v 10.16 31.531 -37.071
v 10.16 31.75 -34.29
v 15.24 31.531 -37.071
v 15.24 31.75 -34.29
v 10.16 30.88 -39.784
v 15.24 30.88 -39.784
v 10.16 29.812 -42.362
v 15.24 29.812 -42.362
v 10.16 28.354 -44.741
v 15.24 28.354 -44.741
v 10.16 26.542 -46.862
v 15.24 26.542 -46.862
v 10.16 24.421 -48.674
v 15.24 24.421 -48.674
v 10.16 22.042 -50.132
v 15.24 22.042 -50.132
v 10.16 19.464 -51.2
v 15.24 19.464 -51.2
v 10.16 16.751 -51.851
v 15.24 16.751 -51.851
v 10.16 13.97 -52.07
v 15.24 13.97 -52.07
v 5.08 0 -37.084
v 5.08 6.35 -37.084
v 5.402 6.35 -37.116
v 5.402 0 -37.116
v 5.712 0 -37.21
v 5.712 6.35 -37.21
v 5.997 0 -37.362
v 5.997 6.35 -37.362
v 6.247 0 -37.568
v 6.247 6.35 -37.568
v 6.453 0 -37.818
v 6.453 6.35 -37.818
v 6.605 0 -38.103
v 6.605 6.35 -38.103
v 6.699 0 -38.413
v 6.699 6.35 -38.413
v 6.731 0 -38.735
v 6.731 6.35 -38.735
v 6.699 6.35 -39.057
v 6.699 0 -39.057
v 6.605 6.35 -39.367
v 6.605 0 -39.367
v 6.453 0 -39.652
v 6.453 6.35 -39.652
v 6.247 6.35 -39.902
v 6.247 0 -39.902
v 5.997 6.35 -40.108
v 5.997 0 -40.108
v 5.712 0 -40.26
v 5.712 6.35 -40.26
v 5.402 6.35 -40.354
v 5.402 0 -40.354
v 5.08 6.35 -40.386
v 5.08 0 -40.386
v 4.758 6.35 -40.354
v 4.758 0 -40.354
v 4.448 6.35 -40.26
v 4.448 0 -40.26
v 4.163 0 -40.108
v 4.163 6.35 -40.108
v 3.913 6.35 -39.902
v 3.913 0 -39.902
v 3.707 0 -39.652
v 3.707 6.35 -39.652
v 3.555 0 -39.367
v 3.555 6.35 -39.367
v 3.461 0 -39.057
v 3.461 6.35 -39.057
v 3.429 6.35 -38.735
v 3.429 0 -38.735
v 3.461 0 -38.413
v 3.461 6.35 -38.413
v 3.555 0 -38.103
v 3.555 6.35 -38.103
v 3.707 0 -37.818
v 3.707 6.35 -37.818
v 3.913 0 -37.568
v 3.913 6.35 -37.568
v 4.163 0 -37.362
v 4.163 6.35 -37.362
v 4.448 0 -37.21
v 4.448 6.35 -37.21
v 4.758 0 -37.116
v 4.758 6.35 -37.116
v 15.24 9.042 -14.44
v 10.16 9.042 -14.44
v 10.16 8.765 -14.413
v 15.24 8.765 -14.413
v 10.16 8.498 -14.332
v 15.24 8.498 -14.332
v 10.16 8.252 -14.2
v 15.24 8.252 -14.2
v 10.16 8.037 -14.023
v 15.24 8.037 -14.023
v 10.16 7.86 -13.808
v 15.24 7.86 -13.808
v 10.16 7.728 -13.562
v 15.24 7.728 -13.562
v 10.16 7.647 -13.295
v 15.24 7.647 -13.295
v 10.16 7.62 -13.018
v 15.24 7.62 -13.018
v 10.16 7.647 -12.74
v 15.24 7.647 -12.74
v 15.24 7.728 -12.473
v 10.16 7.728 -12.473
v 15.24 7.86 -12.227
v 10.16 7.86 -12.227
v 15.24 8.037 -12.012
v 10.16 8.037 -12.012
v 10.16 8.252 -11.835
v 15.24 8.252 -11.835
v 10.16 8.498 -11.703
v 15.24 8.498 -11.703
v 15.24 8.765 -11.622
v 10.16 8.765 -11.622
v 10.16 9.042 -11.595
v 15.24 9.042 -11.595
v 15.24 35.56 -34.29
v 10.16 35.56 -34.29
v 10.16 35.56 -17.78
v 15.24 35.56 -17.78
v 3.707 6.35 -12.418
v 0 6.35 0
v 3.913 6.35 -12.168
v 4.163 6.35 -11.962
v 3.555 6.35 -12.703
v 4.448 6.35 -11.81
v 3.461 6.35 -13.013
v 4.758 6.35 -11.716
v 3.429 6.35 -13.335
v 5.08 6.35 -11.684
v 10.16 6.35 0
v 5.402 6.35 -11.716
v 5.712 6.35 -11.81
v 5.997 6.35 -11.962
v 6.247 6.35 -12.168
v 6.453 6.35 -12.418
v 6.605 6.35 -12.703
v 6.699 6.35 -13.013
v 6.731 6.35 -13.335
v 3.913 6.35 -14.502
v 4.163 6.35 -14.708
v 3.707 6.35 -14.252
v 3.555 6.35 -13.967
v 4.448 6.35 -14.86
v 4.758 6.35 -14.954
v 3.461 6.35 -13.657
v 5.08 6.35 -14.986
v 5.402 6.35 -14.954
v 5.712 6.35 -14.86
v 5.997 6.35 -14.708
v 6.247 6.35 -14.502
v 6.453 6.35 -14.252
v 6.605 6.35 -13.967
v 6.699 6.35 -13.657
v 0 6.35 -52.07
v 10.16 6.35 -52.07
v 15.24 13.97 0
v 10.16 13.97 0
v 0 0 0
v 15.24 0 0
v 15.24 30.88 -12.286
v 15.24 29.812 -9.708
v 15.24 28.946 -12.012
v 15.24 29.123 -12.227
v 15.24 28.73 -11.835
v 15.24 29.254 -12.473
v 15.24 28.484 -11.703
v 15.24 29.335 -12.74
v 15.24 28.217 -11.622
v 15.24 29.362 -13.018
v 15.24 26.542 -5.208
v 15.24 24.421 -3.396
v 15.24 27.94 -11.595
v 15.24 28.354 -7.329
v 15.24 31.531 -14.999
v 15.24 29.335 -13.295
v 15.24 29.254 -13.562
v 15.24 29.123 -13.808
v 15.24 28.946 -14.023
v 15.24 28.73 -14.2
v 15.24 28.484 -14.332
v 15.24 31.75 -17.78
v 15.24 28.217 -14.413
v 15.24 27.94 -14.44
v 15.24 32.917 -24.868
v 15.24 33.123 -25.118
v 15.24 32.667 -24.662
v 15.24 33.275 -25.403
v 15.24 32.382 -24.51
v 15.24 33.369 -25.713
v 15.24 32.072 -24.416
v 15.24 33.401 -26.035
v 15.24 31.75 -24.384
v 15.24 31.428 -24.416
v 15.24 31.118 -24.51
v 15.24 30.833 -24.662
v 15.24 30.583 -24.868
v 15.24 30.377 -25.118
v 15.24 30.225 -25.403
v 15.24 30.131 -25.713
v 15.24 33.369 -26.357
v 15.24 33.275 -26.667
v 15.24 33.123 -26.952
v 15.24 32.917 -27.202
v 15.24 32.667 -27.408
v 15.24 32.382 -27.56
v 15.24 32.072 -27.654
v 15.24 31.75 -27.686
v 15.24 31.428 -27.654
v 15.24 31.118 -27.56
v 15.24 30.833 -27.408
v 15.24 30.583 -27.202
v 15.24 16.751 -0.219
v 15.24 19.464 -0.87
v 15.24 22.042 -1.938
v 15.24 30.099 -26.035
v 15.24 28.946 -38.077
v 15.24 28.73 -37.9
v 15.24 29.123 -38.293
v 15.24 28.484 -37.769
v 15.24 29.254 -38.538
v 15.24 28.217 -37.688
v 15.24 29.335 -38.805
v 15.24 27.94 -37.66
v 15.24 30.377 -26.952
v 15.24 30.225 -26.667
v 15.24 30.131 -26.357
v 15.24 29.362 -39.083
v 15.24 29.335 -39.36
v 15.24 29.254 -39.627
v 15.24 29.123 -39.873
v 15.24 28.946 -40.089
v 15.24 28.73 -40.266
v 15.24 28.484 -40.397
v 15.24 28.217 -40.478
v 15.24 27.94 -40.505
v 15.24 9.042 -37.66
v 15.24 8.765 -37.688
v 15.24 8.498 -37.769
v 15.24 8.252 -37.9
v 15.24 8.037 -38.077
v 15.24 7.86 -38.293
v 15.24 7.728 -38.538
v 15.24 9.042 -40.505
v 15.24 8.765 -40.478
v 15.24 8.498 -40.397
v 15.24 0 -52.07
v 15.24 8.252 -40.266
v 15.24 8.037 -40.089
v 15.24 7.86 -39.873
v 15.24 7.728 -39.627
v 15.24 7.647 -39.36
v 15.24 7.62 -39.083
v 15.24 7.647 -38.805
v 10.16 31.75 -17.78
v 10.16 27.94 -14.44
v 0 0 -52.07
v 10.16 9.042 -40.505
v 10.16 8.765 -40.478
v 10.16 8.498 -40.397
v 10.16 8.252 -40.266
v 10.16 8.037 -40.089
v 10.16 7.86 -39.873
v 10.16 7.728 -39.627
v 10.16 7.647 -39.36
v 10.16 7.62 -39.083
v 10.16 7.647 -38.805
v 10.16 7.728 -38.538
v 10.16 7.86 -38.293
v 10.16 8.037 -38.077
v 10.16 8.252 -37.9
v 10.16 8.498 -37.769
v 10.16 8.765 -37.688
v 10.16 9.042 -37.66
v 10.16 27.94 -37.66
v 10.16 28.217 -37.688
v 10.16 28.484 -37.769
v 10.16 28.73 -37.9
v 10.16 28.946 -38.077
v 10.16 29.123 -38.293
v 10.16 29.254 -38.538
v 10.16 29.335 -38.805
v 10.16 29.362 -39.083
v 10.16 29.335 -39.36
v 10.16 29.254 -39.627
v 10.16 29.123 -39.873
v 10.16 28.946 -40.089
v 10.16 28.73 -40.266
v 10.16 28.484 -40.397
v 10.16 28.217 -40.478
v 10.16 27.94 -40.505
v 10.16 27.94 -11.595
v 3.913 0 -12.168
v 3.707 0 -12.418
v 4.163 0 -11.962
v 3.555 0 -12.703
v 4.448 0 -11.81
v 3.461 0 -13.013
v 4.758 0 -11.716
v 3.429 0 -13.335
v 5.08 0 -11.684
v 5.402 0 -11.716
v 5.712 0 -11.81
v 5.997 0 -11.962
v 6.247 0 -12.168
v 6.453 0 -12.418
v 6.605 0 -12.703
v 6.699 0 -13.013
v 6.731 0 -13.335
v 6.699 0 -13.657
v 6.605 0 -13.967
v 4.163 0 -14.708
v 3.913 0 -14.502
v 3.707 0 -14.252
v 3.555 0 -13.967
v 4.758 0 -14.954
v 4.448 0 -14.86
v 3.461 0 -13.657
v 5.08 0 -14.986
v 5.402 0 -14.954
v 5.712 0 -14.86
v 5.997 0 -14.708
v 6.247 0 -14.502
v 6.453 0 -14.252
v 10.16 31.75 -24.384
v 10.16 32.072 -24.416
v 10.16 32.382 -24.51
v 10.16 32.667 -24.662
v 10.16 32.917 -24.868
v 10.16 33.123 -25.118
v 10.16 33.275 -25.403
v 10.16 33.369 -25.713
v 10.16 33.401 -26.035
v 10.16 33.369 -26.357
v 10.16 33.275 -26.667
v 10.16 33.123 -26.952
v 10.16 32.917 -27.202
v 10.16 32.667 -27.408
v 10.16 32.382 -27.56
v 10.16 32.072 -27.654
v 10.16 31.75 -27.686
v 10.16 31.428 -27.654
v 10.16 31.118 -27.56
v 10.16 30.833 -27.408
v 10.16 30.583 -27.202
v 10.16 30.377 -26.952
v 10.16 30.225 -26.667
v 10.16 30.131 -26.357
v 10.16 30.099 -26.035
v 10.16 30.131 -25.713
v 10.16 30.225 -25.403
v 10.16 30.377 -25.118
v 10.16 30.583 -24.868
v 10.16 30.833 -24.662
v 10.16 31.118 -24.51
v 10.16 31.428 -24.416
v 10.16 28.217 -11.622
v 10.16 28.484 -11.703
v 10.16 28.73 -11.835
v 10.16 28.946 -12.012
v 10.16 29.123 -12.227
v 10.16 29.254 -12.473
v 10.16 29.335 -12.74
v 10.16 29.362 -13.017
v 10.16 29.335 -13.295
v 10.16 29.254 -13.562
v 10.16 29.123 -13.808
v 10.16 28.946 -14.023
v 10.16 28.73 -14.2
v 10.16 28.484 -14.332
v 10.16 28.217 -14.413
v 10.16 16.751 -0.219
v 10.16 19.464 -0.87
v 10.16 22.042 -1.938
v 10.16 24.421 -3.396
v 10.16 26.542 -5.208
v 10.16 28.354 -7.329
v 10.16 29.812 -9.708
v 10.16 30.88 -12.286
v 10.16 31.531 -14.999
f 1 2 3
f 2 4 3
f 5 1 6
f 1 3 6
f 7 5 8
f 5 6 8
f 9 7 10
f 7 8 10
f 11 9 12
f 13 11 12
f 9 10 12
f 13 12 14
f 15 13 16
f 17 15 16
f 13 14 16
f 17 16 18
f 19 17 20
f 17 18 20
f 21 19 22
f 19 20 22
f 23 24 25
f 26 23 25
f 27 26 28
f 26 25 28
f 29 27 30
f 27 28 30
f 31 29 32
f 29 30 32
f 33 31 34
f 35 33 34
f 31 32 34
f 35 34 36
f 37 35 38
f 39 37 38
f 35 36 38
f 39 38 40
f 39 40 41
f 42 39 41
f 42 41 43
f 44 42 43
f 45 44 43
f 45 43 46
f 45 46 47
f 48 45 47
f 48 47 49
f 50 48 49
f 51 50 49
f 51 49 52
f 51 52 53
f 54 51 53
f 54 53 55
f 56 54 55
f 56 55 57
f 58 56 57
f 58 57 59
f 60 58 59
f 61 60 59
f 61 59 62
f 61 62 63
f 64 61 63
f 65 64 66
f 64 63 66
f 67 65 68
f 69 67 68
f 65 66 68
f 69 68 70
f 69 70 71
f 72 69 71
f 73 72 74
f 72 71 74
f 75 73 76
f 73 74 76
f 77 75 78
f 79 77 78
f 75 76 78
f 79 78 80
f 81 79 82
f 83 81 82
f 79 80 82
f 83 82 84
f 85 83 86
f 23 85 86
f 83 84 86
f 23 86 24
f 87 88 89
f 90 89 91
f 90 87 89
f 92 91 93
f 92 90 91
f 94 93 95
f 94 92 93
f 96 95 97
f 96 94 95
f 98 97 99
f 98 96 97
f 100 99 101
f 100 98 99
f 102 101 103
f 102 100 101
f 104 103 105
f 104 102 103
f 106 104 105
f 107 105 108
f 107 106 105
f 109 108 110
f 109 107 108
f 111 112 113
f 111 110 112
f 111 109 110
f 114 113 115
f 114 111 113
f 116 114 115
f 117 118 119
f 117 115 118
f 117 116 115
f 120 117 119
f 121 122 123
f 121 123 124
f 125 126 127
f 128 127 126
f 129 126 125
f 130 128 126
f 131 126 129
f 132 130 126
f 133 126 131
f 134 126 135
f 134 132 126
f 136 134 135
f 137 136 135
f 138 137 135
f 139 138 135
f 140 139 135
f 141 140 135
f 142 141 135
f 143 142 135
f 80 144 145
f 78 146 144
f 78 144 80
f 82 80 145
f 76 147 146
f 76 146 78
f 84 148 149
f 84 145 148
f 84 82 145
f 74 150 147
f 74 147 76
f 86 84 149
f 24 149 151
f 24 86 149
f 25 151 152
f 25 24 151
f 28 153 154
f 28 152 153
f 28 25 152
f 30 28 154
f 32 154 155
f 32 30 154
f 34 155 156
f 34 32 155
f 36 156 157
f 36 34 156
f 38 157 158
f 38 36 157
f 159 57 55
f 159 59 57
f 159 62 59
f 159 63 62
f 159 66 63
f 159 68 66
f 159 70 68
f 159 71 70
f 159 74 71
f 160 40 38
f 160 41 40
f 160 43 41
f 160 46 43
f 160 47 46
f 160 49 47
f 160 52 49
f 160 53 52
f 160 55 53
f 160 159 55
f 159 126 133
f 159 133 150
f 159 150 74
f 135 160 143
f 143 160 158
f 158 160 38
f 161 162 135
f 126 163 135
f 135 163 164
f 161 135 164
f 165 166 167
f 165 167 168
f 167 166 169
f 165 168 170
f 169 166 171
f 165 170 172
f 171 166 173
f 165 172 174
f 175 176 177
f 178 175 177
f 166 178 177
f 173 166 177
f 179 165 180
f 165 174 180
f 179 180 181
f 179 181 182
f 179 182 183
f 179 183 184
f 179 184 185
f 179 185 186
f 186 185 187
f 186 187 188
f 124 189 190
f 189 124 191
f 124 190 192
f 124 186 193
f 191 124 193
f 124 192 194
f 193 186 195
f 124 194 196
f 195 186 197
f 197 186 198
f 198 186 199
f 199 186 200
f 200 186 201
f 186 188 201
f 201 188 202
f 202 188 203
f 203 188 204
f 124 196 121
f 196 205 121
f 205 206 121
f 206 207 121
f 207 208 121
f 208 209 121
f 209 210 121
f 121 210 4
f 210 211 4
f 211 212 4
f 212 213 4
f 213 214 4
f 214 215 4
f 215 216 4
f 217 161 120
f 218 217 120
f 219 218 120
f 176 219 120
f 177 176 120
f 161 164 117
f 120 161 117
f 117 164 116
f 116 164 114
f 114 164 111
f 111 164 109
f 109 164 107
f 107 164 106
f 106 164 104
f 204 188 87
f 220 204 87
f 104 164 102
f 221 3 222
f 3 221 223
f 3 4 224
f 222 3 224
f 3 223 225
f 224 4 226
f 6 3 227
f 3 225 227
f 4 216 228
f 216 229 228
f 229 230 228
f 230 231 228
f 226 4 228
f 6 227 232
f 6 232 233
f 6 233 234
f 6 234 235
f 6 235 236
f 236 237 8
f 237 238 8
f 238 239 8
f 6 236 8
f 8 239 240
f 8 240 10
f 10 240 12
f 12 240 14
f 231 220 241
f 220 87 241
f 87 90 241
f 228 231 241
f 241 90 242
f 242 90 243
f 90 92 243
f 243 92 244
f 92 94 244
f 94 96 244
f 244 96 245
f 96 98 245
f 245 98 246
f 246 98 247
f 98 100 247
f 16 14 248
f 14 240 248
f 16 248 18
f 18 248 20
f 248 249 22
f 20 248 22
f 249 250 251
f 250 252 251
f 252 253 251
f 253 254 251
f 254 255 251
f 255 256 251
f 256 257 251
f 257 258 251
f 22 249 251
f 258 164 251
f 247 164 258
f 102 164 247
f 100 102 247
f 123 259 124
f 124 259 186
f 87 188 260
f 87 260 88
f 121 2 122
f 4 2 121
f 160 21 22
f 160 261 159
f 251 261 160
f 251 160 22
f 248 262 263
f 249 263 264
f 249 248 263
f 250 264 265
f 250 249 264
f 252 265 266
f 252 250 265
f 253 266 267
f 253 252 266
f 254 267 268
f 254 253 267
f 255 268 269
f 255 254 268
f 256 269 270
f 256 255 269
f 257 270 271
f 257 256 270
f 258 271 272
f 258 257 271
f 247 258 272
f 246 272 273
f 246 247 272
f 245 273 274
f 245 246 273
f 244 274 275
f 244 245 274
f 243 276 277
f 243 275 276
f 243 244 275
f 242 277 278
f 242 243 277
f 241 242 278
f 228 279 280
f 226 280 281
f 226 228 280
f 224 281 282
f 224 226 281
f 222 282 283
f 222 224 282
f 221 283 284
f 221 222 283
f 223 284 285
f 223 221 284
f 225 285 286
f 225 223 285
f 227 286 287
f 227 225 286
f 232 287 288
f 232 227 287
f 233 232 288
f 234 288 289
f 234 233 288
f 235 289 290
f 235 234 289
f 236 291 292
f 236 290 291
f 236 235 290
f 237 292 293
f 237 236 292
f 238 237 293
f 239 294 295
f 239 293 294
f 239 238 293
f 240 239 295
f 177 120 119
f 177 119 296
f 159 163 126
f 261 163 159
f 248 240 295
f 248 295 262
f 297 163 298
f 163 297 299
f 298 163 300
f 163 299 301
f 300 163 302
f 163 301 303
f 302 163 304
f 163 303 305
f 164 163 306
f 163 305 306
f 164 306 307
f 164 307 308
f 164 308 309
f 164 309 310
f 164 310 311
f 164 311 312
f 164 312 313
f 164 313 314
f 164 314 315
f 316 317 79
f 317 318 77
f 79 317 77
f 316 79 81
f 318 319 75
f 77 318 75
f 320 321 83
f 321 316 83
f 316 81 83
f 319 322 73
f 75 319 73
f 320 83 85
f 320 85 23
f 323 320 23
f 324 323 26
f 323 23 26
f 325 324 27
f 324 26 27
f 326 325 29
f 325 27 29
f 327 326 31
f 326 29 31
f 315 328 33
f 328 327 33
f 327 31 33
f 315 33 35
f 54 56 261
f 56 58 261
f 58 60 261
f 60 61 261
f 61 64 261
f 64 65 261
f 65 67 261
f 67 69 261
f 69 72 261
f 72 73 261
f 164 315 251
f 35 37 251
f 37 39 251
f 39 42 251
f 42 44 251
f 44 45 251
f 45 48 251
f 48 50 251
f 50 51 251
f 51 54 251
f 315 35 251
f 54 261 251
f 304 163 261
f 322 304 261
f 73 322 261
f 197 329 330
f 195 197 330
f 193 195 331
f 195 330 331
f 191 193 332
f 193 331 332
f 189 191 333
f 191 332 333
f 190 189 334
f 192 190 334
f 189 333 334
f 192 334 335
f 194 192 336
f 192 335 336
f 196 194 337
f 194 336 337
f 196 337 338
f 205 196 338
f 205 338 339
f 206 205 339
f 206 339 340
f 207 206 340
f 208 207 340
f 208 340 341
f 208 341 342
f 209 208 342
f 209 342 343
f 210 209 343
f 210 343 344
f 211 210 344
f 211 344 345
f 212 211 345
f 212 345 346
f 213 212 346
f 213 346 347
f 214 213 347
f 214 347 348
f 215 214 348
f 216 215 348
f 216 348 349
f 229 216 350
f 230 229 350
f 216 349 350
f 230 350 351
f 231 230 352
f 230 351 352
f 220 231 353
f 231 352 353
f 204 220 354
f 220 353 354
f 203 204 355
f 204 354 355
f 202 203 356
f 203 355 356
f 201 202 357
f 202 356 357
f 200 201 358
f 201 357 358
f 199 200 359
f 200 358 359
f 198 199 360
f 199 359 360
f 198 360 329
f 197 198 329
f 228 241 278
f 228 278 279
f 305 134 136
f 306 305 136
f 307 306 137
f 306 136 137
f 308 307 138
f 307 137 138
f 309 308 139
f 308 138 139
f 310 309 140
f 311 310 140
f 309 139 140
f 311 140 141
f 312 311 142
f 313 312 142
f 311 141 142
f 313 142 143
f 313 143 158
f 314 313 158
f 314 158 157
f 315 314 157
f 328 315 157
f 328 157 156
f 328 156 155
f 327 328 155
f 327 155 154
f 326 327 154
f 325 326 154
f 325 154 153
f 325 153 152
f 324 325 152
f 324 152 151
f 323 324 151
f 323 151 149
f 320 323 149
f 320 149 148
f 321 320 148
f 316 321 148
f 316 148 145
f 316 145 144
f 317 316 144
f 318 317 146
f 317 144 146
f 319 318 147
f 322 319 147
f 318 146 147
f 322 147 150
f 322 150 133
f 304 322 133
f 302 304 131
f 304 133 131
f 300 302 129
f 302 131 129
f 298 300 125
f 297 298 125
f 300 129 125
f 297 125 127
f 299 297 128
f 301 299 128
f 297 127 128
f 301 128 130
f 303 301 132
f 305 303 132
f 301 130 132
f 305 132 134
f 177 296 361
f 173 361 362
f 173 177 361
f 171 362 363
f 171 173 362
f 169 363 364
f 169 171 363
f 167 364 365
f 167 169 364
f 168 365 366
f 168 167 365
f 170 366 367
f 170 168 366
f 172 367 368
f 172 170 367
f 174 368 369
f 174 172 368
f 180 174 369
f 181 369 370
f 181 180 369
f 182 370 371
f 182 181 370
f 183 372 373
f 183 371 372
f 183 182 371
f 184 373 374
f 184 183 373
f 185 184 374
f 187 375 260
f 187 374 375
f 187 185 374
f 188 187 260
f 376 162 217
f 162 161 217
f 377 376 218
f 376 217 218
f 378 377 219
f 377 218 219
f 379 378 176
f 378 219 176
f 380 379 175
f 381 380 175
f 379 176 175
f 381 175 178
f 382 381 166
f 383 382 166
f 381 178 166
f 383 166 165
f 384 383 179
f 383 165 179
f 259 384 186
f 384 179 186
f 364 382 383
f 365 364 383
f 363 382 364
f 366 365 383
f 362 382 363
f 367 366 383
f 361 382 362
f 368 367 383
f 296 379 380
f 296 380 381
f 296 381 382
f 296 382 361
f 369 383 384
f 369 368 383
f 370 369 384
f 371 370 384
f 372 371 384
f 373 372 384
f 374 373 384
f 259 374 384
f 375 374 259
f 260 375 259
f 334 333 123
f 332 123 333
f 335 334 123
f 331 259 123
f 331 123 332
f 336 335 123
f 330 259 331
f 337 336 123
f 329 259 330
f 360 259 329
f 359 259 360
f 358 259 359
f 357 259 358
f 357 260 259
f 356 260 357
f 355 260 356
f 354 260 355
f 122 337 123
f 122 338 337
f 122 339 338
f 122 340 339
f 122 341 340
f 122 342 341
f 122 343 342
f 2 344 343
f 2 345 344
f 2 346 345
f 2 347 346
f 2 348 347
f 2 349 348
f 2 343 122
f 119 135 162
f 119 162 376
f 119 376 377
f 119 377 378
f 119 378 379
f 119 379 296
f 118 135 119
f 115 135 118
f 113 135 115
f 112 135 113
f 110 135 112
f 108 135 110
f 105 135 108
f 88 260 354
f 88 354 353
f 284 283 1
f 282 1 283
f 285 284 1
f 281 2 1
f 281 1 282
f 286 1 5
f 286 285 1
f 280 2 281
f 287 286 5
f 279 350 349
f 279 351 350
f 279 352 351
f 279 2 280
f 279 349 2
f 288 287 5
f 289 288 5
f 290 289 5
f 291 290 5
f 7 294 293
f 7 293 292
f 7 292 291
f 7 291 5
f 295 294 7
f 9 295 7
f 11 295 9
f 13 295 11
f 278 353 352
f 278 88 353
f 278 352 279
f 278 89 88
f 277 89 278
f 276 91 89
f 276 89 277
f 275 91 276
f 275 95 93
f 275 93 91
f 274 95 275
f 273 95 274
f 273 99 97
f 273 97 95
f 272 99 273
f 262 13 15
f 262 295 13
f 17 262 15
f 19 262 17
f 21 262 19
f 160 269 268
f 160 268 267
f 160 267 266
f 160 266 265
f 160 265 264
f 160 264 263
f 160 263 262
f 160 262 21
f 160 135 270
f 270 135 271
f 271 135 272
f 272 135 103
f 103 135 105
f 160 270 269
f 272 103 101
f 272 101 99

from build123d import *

# Parameters (mm, degrees)
SKETCH1_W           = 15.24
SKETCH1_H           = 52.07
BOSS_EXTRUDE1_DEPTH = 6.35
SKETCH2_W           = 5.08
SKETCH2_H           = 52.07
BOSS_EXTRUDE2_DEPTH = 25.4
CUT_EXTRUDE1_DEPTH  = 8.382
SKETCH4_R           = 1.651
CUT_EXTRUDE2_DEPTH  = 8.382
FILLET1_R           = 17.78
SKETCH6_W           = 5.08
SKETCH6_H           = 16.51
BOSS_EXTRUDE3_DEPTH = 3.81
SKETCH7_R           = 1.651
CUT_EXTRUDE3_DEPTH  = 14.478


with BuildPart() as part:
    # Sketch1 → Boss-Extrude1 (new body)
    with BuildSketch(Plane(origin=(0, 0, 0), x_dir=(1, 0, 0), z_dir=(0, 1, 0))):
        with Locations((7.62, 26.035)):
            Rectangle(SKETCH1_W, SKETCH1_H)
    extrude(amount=BOSS_EXTRUDE1_DEPTH)

    # Sketch2 → Boss-Extrude2 (add)
    with BuildSketch(Plane(origin=(0, 6.35, 0), x_dir=(1, 0, 0), z_dir=(0, 1, 0))):
        with Locations((12.7, 26.035)):
            Rectangle(SKETCH2_W, SKETCH2_H)
    extrude(amount=BOSS_EXTRUDE2_DEPTH)

    # Sketch3 → Cut-Extrude1 (cut)
    with BuildSketch(Plane(origin=(15.24, 0, 0), x_dir=(0, 0, -1), z_dir=(1, 0, 0))):
        with BuildLine():
            Line((14.4399, 27.94), (14.4399, 9.0424))
            ThreePointArc((14.4399, 9.0424), (13.0175, 7.62), (11.5951, 9.0424))
            Line((11.5951, 9.0424), (11.5951, 27.94))
            ThreePointArc((11.5951, 27.94), (13.0175, 29.3624), (14.4399, 27.94))
        make_face()
        with BuildLine():
            Line((40.50522627, 27.94), (40.50522627, 9.0424))
            ThreePointArc((40.50522627, 9.0424), (39.08282627, 7.62), (37.66042627, 9.0424))
            Line((37.66042627, 9.0424), (37.66042627, 27.94))
            ThreePointArc((37.66042627, 27.94), (39.08282627, 29.3624), (40.50522627, 27.94))
        make_face()
    extrude(amount=-CUT_EXTRUDE1_DEPTH, mode=Mode.SUBTRACT)

    # Sketch4 → Cut-Extrude2 (cut)
    with BuildSketch(Plane(origin=(0, 6.35, 0), x_dir=(1, 0, 0), z_dir=(0, 1, 0))):
        with Locations(Location((5.08, 38.735, 0), (0, 0, 270))):
            Circle(SKETCH4_R)
        with Locations(Location((5.08, 13.335, 0), (0, 0, 270))):
            Circle(SKETCH4_R)
    extrude(amount=-CUT_EXTRUDE2_DEPTH, mode=Mode.SUBTRACT)

    # Fillet1
    fillet1_edges = [part.edges().sort_by_distance(p)[0] for p in [
        (12.7, 31.75, -52.07),
        (12.7, 31.75, 0),
    ]]
    fillet(fillet1_edges, radius=FILLET1_R)

    # Sketch6 → Boss-Extrude3 (add)
    with BuildSketch(Plane(origin=(0, 31.75, 0), x_dir=(1, 0, 0), z_dir=(0, 1, 0))):
        with Locations((12.7, 26.035)):
            Rectangle(SKETCH6_W, SKETCH6_H)
    extrude(amount=BOSS_EXTRUDE3_DEPTH)

    # Sketch7 → Cut-Extrude3 (cut)
    with BuildSketch(Plane.ZY.offset(-10.16)):
        with Locations((-26.035, 31.75)):
            Circle(SKETCH7_R)
    extrude(amount=-CUT_EXTRUDE3_DEPTH, mode=Mode.SUBTRACT)


solid = part.part
